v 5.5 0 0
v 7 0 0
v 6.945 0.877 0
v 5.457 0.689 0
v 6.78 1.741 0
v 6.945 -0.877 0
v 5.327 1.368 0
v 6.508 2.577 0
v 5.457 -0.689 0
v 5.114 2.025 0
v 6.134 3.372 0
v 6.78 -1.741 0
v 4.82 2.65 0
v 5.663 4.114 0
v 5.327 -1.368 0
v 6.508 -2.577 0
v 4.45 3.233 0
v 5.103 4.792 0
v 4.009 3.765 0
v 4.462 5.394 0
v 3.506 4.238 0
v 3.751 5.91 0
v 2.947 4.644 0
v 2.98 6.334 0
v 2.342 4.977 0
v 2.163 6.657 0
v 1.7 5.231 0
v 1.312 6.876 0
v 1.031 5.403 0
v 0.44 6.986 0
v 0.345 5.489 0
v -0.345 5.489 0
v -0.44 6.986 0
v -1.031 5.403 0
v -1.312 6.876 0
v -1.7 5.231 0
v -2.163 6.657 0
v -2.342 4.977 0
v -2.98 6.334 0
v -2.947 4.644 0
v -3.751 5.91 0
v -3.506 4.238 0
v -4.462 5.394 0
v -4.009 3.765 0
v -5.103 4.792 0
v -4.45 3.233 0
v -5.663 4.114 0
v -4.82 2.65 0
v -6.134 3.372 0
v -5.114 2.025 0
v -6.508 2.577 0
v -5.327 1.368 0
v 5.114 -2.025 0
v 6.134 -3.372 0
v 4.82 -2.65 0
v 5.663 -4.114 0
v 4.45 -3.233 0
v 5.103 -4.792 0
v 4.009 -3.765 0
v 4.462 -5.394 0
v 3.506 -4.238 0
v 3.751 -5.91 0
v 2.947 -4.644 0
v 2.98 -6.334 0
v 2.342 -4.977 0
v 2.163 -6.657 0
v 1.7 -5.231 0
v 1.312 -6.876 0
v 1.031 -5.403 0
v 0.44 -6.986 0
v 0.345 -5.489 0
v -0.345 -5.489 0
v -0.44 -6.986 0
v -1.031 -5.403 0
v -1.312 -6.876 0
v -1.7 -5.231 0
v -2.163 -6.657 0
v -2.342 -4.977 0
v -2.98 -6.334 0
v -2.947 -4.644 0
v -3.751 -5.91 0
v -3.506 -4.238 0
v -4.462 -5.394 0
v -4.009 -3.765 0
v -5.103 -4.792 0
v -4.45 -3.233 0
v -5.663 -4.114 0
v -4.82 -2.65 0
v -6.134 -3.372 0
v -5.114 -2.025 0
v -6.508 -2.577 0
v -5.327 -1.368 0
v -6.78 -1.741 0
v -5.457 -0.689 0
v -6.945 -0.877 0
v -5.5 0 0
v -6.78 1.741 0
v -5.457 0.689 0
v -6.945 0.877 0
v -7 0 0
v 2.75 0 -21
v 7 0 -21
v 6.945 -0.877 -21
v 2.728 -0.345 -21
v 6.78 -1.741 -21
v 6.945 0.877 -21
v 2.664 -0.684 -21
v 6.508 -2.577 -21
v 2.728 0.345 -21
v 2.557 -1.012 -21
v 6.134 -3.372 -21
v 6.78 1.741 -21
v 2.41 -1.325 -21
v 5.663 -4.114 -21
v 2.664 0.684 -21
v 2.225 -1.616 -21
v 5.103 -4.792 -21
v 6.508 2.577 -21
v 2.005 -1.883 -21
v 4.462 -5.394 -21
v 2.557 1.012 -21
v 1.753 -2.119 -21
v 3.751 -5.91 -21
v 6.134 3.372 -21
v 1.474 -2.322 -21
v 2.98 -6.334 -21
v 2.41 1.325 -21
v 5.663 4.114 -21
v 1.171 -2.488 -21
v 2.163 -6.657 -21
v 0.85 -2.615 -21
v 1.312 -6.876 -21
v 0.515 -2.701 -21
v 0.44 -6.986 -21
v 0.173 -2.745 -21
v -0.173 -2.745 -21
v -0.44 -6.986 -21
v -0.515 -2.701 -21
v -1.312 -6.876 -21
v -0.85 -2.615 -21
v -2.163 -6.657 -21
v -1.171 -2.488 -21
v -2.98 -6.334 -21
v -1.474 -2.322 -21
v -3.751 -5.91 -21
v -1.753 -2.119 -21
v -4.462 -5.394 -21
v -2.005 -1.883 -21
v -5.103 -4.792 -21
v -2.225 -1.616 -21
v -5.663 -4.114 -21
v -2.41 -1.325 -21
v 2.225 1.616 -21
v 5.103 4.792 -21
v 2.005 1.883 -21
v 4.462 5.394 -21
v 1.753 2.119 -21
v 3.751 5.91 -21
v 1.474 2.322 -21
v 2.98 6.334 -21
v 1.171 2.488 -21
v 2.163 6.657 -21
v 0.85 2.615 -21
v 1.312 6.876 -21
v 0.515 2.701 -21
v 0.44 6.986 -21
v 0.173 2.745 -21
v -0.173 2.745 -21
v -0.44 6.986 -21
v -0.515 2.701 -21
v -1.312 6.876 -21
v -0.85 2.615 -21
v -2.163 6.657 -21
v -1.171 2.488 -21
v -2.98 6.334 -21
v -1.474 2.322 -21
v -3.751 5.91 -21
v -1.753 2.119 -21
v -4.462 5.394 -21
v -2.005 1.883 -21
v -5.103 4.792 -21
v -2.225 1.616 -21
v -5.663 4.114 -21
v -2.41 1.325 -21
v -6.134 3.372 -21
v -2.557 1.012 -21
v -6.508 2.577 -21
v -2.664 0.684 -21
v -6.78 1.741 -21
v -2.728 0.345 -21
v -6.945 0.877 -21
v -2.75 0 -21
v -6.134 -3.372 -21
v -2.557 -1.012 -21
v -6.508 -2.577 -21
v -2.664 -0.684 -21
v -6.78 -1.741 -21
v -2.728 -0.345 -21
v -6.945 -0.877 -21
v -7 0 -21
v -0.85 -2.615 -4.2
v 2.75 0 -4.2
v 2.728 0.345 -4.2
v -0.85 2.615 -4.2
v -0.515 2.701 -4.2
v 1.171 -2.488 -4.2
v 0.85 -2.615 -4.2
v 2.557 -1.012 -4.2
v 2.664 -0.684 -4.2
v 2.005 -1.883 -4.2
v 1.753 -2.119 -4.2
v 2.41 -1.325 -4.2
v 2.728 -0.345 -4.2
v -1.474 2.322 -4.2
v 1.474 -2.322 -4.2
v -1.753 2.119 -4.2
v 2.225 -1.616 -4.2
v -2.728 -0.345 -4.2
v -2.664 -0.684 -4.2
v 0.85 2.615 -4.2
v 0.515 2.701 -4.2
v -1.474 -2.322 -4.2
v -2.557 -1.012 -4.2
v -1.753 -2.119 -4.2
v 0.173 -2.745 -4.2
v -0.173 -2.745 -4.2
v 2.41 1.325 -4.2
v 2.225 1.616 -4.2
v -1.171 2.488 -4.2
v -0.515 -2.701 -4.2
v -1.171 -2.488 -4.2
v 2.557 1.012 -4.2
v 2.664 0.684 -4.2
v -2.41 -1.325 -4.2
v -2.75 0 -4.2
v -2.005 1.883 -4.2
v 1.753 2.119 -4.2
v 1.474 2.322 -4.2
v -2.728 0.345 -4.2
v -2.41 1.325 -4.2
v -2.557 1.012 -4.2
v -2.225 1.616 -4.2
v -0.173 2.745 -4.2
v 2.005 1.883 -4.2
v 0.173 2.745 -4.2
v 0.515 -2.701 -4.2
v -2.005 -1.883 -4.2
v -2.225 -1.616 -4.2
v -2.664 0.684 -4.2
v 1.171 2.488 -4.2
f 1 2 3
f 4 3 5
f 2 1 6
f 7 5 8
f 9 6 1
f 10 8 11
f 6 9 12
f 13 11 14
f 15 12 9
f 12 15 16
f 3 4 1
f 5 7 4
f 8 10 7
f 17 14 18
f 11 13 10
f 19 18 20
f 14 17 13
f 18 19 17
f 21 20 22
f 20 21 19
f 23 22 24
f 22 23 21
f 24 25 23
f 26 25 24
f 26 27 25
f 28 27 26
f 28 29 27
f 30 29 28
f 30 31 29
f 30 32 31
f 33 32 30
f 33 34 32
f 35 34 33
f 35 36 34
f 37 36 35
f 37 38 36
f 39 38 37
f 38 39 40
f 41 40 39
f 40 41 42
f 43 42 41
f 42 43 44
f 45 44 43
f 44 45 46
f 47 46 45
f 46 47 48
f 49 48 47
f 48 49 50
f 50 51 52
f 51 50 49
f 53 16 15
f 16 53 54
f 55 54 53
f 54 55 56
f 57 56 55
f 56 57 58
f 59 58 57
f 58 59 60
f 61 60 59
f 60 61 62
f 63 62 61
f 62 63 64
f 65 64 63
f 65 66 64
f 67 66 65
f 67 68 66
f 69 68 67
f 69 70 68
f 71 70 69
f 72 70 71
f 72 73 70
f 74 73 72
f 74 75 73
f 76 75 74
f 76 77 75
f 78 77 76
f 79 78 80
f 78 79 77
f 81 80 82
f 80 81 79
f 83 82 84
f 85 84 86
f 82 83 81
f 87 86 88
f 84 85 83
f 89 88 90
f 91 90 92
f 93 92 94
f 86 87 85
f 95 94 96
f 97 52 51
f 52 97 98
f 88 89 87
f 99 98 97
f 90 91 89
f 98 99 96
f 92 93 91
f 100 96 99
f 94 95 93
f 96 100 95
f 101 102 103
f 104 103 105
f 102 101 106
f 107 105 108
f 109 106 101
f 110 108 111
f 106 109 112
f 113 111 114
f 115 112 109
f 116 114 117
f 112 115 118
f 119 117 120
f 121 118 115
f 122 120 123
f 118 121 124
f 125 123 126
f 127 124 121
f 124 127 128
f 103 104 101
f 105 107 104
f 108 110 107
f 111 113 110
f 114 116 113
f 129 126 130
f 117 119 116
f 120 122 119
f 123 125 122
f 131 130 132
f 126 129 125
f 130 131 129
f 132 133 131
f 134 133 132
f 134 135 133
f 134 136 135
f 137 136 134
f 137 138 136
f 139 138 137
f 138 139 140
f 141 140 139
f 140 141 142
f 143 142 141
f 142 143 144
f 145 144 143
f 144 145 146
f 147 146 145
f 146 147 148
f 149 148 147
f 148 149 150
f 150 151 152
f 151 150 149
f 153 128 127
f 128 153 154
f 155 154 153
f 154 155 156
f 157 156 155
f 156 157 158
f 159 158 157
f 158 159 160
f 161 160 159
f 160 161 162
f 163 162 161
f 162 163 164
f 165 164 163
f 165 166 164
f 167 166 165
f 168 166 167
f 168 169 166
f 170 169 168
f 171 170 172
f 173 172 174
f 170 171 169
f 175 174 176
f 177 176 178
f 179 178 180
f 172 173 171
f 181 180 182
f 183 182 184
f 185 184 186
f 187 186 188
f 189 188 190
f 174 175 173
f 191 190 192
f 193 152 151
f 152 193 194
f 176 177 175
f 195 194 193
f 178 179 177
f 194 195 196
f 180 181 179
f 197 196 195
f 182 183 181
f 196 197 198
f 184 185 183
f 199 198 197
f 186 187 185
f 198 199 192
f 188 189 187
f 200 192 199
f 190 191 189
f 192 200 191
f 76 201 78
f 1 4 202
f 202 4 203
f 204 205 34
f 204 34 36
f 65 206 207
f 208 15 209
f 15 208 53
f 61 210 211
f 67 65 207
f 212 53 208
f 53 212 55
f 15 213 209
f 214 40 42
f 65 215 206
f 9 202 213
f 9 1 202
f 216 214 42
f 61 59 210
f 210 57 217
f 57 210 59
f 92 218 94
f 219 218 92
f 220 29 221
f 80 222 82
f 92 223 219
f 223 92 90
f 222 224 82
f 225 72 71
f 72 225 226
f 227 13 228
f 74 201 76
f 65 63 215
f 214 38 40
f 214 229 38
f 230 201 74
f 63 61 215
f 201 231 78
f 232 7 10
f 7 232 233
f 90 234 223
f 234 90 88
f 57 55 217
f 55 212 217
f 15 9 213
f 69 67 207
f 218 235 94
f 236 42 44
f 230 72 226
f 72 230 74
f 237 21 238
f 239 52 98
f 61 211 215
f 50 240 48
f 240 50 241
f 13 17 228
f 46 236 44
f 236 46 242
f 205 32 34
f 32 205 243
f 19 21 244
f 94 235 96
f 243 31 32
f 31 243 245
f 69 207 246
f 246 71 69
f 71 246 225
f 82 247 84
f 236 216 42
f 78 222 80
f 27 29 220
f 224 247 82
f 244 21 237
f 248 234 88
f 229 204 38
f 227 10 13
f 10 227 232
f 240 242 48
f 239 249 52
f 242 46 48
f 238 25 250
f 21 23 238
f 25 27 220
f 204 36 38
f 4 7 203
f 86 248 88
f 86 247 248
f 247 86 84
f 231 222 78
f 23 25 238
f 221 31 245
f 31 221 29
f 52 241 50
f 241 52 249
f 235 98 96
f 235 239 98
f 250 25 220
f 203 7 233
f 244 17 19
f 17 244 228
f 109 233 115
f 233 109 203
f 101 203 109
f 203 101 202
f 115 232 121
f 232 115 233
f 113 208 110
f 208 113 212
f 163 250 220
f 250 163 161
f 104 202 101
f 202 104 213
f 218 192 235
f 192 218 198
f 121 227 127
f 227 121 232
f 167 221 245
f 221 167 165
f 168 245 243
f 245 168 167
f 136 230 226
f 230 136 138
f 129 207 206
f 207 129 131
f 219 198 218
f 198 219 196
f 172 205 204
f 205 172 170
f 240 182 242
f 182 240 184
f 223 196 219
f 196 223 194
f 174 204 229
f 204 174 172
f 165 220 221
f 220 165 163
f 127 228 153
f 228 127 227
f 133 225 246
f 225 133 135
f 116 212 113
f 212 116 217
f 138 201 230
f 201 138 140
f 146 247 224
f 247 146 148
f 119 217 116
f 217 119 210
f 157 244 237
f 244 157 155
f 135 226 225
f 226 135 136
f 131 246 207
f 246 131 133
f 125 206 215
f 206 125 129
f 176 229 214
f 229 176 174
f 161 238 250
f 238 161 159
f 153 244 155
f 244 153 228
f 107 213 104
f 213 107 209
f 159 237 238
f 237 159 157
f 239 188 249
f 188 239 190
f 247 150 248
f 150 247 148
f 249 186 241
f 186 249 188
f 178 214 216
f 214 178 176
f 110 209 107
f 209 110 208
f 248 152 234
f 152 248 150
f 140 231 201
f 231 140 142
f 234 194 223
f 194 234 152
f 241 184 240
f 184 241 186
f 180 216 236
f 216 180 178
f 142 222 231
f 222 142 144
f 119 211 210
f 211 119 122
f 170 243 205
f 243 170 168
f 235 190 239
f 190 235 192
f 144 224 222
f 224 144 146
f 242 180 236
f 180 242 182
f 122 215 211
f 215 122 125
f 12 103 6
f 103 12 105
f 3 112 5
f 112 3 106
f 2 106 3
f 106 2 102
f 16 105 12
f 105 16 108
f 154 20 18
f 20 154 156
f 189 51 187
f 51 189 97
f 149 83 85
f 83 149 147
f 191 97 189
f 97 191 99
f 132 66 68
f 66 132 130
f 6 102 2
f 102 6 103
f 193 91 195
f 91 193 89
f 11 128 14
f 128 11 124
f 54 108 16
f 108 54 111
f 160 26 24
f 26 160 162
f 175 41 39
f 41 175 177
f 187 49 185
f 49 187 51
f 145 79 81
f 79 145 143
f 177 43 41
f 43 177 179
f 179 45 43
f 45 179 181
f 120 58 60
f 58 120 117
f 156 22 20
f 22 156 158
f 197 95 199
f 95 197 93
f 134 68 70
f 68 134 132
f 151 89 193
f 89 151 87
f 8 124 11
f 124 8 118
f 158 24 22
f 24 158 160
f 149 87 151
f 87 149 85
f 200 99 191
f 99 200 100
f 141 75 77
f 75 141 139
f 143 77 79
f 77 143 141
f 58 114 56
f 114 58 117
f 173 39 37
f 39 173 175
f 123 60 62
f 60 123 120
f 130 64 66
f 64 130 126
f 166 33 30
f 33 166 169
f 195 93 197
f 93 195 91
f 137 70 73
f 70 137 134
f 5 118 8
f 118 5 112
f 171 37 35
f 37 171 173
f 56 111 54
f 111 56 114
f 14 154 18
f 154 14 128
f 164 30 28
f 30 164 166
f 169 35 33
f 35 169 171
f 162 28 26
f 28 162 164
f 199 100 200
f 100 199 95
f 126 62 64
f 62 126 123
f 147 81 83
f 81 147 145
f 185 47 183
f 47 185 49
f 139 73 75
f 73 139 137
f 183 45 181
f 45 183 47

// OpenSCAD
$fn = 50;


difference() {
	union() {
		translate(v = [0, 0, -21.0000000000]) {
			cylinder(h = 21, r = 7.0000000000);
		}
		cylinder(h = 0, r = 13.0000000000);
	}
	union() {
		translate(v = [0, 0, 0]) {
			rotate(a = [0, 0, 0]) {
				difference() {
					union() {
						#translate(v = [0, 0, -21.0000000000]) {
							cylinder(h = 21, r = 2.2500000000);
						}
						#translate(v = [0, 0, -4.2000000000]) {
							cylinder(h = 4.2000000000, r = 7.0000000000, r1 = 2.7500000000, r2 = 5.5000000000);
						}
						#translate(v = [0, 0, -21.0000000000]) {
							cylinder(h = 21, r = 2.7500000000);
						}
						#translate(v = [0, 0, -21.0000000000]) {
							cylinder(h = 21, r = 2.2500000000);
						}
					}
					union();
				}
			}
		}
	}
}
